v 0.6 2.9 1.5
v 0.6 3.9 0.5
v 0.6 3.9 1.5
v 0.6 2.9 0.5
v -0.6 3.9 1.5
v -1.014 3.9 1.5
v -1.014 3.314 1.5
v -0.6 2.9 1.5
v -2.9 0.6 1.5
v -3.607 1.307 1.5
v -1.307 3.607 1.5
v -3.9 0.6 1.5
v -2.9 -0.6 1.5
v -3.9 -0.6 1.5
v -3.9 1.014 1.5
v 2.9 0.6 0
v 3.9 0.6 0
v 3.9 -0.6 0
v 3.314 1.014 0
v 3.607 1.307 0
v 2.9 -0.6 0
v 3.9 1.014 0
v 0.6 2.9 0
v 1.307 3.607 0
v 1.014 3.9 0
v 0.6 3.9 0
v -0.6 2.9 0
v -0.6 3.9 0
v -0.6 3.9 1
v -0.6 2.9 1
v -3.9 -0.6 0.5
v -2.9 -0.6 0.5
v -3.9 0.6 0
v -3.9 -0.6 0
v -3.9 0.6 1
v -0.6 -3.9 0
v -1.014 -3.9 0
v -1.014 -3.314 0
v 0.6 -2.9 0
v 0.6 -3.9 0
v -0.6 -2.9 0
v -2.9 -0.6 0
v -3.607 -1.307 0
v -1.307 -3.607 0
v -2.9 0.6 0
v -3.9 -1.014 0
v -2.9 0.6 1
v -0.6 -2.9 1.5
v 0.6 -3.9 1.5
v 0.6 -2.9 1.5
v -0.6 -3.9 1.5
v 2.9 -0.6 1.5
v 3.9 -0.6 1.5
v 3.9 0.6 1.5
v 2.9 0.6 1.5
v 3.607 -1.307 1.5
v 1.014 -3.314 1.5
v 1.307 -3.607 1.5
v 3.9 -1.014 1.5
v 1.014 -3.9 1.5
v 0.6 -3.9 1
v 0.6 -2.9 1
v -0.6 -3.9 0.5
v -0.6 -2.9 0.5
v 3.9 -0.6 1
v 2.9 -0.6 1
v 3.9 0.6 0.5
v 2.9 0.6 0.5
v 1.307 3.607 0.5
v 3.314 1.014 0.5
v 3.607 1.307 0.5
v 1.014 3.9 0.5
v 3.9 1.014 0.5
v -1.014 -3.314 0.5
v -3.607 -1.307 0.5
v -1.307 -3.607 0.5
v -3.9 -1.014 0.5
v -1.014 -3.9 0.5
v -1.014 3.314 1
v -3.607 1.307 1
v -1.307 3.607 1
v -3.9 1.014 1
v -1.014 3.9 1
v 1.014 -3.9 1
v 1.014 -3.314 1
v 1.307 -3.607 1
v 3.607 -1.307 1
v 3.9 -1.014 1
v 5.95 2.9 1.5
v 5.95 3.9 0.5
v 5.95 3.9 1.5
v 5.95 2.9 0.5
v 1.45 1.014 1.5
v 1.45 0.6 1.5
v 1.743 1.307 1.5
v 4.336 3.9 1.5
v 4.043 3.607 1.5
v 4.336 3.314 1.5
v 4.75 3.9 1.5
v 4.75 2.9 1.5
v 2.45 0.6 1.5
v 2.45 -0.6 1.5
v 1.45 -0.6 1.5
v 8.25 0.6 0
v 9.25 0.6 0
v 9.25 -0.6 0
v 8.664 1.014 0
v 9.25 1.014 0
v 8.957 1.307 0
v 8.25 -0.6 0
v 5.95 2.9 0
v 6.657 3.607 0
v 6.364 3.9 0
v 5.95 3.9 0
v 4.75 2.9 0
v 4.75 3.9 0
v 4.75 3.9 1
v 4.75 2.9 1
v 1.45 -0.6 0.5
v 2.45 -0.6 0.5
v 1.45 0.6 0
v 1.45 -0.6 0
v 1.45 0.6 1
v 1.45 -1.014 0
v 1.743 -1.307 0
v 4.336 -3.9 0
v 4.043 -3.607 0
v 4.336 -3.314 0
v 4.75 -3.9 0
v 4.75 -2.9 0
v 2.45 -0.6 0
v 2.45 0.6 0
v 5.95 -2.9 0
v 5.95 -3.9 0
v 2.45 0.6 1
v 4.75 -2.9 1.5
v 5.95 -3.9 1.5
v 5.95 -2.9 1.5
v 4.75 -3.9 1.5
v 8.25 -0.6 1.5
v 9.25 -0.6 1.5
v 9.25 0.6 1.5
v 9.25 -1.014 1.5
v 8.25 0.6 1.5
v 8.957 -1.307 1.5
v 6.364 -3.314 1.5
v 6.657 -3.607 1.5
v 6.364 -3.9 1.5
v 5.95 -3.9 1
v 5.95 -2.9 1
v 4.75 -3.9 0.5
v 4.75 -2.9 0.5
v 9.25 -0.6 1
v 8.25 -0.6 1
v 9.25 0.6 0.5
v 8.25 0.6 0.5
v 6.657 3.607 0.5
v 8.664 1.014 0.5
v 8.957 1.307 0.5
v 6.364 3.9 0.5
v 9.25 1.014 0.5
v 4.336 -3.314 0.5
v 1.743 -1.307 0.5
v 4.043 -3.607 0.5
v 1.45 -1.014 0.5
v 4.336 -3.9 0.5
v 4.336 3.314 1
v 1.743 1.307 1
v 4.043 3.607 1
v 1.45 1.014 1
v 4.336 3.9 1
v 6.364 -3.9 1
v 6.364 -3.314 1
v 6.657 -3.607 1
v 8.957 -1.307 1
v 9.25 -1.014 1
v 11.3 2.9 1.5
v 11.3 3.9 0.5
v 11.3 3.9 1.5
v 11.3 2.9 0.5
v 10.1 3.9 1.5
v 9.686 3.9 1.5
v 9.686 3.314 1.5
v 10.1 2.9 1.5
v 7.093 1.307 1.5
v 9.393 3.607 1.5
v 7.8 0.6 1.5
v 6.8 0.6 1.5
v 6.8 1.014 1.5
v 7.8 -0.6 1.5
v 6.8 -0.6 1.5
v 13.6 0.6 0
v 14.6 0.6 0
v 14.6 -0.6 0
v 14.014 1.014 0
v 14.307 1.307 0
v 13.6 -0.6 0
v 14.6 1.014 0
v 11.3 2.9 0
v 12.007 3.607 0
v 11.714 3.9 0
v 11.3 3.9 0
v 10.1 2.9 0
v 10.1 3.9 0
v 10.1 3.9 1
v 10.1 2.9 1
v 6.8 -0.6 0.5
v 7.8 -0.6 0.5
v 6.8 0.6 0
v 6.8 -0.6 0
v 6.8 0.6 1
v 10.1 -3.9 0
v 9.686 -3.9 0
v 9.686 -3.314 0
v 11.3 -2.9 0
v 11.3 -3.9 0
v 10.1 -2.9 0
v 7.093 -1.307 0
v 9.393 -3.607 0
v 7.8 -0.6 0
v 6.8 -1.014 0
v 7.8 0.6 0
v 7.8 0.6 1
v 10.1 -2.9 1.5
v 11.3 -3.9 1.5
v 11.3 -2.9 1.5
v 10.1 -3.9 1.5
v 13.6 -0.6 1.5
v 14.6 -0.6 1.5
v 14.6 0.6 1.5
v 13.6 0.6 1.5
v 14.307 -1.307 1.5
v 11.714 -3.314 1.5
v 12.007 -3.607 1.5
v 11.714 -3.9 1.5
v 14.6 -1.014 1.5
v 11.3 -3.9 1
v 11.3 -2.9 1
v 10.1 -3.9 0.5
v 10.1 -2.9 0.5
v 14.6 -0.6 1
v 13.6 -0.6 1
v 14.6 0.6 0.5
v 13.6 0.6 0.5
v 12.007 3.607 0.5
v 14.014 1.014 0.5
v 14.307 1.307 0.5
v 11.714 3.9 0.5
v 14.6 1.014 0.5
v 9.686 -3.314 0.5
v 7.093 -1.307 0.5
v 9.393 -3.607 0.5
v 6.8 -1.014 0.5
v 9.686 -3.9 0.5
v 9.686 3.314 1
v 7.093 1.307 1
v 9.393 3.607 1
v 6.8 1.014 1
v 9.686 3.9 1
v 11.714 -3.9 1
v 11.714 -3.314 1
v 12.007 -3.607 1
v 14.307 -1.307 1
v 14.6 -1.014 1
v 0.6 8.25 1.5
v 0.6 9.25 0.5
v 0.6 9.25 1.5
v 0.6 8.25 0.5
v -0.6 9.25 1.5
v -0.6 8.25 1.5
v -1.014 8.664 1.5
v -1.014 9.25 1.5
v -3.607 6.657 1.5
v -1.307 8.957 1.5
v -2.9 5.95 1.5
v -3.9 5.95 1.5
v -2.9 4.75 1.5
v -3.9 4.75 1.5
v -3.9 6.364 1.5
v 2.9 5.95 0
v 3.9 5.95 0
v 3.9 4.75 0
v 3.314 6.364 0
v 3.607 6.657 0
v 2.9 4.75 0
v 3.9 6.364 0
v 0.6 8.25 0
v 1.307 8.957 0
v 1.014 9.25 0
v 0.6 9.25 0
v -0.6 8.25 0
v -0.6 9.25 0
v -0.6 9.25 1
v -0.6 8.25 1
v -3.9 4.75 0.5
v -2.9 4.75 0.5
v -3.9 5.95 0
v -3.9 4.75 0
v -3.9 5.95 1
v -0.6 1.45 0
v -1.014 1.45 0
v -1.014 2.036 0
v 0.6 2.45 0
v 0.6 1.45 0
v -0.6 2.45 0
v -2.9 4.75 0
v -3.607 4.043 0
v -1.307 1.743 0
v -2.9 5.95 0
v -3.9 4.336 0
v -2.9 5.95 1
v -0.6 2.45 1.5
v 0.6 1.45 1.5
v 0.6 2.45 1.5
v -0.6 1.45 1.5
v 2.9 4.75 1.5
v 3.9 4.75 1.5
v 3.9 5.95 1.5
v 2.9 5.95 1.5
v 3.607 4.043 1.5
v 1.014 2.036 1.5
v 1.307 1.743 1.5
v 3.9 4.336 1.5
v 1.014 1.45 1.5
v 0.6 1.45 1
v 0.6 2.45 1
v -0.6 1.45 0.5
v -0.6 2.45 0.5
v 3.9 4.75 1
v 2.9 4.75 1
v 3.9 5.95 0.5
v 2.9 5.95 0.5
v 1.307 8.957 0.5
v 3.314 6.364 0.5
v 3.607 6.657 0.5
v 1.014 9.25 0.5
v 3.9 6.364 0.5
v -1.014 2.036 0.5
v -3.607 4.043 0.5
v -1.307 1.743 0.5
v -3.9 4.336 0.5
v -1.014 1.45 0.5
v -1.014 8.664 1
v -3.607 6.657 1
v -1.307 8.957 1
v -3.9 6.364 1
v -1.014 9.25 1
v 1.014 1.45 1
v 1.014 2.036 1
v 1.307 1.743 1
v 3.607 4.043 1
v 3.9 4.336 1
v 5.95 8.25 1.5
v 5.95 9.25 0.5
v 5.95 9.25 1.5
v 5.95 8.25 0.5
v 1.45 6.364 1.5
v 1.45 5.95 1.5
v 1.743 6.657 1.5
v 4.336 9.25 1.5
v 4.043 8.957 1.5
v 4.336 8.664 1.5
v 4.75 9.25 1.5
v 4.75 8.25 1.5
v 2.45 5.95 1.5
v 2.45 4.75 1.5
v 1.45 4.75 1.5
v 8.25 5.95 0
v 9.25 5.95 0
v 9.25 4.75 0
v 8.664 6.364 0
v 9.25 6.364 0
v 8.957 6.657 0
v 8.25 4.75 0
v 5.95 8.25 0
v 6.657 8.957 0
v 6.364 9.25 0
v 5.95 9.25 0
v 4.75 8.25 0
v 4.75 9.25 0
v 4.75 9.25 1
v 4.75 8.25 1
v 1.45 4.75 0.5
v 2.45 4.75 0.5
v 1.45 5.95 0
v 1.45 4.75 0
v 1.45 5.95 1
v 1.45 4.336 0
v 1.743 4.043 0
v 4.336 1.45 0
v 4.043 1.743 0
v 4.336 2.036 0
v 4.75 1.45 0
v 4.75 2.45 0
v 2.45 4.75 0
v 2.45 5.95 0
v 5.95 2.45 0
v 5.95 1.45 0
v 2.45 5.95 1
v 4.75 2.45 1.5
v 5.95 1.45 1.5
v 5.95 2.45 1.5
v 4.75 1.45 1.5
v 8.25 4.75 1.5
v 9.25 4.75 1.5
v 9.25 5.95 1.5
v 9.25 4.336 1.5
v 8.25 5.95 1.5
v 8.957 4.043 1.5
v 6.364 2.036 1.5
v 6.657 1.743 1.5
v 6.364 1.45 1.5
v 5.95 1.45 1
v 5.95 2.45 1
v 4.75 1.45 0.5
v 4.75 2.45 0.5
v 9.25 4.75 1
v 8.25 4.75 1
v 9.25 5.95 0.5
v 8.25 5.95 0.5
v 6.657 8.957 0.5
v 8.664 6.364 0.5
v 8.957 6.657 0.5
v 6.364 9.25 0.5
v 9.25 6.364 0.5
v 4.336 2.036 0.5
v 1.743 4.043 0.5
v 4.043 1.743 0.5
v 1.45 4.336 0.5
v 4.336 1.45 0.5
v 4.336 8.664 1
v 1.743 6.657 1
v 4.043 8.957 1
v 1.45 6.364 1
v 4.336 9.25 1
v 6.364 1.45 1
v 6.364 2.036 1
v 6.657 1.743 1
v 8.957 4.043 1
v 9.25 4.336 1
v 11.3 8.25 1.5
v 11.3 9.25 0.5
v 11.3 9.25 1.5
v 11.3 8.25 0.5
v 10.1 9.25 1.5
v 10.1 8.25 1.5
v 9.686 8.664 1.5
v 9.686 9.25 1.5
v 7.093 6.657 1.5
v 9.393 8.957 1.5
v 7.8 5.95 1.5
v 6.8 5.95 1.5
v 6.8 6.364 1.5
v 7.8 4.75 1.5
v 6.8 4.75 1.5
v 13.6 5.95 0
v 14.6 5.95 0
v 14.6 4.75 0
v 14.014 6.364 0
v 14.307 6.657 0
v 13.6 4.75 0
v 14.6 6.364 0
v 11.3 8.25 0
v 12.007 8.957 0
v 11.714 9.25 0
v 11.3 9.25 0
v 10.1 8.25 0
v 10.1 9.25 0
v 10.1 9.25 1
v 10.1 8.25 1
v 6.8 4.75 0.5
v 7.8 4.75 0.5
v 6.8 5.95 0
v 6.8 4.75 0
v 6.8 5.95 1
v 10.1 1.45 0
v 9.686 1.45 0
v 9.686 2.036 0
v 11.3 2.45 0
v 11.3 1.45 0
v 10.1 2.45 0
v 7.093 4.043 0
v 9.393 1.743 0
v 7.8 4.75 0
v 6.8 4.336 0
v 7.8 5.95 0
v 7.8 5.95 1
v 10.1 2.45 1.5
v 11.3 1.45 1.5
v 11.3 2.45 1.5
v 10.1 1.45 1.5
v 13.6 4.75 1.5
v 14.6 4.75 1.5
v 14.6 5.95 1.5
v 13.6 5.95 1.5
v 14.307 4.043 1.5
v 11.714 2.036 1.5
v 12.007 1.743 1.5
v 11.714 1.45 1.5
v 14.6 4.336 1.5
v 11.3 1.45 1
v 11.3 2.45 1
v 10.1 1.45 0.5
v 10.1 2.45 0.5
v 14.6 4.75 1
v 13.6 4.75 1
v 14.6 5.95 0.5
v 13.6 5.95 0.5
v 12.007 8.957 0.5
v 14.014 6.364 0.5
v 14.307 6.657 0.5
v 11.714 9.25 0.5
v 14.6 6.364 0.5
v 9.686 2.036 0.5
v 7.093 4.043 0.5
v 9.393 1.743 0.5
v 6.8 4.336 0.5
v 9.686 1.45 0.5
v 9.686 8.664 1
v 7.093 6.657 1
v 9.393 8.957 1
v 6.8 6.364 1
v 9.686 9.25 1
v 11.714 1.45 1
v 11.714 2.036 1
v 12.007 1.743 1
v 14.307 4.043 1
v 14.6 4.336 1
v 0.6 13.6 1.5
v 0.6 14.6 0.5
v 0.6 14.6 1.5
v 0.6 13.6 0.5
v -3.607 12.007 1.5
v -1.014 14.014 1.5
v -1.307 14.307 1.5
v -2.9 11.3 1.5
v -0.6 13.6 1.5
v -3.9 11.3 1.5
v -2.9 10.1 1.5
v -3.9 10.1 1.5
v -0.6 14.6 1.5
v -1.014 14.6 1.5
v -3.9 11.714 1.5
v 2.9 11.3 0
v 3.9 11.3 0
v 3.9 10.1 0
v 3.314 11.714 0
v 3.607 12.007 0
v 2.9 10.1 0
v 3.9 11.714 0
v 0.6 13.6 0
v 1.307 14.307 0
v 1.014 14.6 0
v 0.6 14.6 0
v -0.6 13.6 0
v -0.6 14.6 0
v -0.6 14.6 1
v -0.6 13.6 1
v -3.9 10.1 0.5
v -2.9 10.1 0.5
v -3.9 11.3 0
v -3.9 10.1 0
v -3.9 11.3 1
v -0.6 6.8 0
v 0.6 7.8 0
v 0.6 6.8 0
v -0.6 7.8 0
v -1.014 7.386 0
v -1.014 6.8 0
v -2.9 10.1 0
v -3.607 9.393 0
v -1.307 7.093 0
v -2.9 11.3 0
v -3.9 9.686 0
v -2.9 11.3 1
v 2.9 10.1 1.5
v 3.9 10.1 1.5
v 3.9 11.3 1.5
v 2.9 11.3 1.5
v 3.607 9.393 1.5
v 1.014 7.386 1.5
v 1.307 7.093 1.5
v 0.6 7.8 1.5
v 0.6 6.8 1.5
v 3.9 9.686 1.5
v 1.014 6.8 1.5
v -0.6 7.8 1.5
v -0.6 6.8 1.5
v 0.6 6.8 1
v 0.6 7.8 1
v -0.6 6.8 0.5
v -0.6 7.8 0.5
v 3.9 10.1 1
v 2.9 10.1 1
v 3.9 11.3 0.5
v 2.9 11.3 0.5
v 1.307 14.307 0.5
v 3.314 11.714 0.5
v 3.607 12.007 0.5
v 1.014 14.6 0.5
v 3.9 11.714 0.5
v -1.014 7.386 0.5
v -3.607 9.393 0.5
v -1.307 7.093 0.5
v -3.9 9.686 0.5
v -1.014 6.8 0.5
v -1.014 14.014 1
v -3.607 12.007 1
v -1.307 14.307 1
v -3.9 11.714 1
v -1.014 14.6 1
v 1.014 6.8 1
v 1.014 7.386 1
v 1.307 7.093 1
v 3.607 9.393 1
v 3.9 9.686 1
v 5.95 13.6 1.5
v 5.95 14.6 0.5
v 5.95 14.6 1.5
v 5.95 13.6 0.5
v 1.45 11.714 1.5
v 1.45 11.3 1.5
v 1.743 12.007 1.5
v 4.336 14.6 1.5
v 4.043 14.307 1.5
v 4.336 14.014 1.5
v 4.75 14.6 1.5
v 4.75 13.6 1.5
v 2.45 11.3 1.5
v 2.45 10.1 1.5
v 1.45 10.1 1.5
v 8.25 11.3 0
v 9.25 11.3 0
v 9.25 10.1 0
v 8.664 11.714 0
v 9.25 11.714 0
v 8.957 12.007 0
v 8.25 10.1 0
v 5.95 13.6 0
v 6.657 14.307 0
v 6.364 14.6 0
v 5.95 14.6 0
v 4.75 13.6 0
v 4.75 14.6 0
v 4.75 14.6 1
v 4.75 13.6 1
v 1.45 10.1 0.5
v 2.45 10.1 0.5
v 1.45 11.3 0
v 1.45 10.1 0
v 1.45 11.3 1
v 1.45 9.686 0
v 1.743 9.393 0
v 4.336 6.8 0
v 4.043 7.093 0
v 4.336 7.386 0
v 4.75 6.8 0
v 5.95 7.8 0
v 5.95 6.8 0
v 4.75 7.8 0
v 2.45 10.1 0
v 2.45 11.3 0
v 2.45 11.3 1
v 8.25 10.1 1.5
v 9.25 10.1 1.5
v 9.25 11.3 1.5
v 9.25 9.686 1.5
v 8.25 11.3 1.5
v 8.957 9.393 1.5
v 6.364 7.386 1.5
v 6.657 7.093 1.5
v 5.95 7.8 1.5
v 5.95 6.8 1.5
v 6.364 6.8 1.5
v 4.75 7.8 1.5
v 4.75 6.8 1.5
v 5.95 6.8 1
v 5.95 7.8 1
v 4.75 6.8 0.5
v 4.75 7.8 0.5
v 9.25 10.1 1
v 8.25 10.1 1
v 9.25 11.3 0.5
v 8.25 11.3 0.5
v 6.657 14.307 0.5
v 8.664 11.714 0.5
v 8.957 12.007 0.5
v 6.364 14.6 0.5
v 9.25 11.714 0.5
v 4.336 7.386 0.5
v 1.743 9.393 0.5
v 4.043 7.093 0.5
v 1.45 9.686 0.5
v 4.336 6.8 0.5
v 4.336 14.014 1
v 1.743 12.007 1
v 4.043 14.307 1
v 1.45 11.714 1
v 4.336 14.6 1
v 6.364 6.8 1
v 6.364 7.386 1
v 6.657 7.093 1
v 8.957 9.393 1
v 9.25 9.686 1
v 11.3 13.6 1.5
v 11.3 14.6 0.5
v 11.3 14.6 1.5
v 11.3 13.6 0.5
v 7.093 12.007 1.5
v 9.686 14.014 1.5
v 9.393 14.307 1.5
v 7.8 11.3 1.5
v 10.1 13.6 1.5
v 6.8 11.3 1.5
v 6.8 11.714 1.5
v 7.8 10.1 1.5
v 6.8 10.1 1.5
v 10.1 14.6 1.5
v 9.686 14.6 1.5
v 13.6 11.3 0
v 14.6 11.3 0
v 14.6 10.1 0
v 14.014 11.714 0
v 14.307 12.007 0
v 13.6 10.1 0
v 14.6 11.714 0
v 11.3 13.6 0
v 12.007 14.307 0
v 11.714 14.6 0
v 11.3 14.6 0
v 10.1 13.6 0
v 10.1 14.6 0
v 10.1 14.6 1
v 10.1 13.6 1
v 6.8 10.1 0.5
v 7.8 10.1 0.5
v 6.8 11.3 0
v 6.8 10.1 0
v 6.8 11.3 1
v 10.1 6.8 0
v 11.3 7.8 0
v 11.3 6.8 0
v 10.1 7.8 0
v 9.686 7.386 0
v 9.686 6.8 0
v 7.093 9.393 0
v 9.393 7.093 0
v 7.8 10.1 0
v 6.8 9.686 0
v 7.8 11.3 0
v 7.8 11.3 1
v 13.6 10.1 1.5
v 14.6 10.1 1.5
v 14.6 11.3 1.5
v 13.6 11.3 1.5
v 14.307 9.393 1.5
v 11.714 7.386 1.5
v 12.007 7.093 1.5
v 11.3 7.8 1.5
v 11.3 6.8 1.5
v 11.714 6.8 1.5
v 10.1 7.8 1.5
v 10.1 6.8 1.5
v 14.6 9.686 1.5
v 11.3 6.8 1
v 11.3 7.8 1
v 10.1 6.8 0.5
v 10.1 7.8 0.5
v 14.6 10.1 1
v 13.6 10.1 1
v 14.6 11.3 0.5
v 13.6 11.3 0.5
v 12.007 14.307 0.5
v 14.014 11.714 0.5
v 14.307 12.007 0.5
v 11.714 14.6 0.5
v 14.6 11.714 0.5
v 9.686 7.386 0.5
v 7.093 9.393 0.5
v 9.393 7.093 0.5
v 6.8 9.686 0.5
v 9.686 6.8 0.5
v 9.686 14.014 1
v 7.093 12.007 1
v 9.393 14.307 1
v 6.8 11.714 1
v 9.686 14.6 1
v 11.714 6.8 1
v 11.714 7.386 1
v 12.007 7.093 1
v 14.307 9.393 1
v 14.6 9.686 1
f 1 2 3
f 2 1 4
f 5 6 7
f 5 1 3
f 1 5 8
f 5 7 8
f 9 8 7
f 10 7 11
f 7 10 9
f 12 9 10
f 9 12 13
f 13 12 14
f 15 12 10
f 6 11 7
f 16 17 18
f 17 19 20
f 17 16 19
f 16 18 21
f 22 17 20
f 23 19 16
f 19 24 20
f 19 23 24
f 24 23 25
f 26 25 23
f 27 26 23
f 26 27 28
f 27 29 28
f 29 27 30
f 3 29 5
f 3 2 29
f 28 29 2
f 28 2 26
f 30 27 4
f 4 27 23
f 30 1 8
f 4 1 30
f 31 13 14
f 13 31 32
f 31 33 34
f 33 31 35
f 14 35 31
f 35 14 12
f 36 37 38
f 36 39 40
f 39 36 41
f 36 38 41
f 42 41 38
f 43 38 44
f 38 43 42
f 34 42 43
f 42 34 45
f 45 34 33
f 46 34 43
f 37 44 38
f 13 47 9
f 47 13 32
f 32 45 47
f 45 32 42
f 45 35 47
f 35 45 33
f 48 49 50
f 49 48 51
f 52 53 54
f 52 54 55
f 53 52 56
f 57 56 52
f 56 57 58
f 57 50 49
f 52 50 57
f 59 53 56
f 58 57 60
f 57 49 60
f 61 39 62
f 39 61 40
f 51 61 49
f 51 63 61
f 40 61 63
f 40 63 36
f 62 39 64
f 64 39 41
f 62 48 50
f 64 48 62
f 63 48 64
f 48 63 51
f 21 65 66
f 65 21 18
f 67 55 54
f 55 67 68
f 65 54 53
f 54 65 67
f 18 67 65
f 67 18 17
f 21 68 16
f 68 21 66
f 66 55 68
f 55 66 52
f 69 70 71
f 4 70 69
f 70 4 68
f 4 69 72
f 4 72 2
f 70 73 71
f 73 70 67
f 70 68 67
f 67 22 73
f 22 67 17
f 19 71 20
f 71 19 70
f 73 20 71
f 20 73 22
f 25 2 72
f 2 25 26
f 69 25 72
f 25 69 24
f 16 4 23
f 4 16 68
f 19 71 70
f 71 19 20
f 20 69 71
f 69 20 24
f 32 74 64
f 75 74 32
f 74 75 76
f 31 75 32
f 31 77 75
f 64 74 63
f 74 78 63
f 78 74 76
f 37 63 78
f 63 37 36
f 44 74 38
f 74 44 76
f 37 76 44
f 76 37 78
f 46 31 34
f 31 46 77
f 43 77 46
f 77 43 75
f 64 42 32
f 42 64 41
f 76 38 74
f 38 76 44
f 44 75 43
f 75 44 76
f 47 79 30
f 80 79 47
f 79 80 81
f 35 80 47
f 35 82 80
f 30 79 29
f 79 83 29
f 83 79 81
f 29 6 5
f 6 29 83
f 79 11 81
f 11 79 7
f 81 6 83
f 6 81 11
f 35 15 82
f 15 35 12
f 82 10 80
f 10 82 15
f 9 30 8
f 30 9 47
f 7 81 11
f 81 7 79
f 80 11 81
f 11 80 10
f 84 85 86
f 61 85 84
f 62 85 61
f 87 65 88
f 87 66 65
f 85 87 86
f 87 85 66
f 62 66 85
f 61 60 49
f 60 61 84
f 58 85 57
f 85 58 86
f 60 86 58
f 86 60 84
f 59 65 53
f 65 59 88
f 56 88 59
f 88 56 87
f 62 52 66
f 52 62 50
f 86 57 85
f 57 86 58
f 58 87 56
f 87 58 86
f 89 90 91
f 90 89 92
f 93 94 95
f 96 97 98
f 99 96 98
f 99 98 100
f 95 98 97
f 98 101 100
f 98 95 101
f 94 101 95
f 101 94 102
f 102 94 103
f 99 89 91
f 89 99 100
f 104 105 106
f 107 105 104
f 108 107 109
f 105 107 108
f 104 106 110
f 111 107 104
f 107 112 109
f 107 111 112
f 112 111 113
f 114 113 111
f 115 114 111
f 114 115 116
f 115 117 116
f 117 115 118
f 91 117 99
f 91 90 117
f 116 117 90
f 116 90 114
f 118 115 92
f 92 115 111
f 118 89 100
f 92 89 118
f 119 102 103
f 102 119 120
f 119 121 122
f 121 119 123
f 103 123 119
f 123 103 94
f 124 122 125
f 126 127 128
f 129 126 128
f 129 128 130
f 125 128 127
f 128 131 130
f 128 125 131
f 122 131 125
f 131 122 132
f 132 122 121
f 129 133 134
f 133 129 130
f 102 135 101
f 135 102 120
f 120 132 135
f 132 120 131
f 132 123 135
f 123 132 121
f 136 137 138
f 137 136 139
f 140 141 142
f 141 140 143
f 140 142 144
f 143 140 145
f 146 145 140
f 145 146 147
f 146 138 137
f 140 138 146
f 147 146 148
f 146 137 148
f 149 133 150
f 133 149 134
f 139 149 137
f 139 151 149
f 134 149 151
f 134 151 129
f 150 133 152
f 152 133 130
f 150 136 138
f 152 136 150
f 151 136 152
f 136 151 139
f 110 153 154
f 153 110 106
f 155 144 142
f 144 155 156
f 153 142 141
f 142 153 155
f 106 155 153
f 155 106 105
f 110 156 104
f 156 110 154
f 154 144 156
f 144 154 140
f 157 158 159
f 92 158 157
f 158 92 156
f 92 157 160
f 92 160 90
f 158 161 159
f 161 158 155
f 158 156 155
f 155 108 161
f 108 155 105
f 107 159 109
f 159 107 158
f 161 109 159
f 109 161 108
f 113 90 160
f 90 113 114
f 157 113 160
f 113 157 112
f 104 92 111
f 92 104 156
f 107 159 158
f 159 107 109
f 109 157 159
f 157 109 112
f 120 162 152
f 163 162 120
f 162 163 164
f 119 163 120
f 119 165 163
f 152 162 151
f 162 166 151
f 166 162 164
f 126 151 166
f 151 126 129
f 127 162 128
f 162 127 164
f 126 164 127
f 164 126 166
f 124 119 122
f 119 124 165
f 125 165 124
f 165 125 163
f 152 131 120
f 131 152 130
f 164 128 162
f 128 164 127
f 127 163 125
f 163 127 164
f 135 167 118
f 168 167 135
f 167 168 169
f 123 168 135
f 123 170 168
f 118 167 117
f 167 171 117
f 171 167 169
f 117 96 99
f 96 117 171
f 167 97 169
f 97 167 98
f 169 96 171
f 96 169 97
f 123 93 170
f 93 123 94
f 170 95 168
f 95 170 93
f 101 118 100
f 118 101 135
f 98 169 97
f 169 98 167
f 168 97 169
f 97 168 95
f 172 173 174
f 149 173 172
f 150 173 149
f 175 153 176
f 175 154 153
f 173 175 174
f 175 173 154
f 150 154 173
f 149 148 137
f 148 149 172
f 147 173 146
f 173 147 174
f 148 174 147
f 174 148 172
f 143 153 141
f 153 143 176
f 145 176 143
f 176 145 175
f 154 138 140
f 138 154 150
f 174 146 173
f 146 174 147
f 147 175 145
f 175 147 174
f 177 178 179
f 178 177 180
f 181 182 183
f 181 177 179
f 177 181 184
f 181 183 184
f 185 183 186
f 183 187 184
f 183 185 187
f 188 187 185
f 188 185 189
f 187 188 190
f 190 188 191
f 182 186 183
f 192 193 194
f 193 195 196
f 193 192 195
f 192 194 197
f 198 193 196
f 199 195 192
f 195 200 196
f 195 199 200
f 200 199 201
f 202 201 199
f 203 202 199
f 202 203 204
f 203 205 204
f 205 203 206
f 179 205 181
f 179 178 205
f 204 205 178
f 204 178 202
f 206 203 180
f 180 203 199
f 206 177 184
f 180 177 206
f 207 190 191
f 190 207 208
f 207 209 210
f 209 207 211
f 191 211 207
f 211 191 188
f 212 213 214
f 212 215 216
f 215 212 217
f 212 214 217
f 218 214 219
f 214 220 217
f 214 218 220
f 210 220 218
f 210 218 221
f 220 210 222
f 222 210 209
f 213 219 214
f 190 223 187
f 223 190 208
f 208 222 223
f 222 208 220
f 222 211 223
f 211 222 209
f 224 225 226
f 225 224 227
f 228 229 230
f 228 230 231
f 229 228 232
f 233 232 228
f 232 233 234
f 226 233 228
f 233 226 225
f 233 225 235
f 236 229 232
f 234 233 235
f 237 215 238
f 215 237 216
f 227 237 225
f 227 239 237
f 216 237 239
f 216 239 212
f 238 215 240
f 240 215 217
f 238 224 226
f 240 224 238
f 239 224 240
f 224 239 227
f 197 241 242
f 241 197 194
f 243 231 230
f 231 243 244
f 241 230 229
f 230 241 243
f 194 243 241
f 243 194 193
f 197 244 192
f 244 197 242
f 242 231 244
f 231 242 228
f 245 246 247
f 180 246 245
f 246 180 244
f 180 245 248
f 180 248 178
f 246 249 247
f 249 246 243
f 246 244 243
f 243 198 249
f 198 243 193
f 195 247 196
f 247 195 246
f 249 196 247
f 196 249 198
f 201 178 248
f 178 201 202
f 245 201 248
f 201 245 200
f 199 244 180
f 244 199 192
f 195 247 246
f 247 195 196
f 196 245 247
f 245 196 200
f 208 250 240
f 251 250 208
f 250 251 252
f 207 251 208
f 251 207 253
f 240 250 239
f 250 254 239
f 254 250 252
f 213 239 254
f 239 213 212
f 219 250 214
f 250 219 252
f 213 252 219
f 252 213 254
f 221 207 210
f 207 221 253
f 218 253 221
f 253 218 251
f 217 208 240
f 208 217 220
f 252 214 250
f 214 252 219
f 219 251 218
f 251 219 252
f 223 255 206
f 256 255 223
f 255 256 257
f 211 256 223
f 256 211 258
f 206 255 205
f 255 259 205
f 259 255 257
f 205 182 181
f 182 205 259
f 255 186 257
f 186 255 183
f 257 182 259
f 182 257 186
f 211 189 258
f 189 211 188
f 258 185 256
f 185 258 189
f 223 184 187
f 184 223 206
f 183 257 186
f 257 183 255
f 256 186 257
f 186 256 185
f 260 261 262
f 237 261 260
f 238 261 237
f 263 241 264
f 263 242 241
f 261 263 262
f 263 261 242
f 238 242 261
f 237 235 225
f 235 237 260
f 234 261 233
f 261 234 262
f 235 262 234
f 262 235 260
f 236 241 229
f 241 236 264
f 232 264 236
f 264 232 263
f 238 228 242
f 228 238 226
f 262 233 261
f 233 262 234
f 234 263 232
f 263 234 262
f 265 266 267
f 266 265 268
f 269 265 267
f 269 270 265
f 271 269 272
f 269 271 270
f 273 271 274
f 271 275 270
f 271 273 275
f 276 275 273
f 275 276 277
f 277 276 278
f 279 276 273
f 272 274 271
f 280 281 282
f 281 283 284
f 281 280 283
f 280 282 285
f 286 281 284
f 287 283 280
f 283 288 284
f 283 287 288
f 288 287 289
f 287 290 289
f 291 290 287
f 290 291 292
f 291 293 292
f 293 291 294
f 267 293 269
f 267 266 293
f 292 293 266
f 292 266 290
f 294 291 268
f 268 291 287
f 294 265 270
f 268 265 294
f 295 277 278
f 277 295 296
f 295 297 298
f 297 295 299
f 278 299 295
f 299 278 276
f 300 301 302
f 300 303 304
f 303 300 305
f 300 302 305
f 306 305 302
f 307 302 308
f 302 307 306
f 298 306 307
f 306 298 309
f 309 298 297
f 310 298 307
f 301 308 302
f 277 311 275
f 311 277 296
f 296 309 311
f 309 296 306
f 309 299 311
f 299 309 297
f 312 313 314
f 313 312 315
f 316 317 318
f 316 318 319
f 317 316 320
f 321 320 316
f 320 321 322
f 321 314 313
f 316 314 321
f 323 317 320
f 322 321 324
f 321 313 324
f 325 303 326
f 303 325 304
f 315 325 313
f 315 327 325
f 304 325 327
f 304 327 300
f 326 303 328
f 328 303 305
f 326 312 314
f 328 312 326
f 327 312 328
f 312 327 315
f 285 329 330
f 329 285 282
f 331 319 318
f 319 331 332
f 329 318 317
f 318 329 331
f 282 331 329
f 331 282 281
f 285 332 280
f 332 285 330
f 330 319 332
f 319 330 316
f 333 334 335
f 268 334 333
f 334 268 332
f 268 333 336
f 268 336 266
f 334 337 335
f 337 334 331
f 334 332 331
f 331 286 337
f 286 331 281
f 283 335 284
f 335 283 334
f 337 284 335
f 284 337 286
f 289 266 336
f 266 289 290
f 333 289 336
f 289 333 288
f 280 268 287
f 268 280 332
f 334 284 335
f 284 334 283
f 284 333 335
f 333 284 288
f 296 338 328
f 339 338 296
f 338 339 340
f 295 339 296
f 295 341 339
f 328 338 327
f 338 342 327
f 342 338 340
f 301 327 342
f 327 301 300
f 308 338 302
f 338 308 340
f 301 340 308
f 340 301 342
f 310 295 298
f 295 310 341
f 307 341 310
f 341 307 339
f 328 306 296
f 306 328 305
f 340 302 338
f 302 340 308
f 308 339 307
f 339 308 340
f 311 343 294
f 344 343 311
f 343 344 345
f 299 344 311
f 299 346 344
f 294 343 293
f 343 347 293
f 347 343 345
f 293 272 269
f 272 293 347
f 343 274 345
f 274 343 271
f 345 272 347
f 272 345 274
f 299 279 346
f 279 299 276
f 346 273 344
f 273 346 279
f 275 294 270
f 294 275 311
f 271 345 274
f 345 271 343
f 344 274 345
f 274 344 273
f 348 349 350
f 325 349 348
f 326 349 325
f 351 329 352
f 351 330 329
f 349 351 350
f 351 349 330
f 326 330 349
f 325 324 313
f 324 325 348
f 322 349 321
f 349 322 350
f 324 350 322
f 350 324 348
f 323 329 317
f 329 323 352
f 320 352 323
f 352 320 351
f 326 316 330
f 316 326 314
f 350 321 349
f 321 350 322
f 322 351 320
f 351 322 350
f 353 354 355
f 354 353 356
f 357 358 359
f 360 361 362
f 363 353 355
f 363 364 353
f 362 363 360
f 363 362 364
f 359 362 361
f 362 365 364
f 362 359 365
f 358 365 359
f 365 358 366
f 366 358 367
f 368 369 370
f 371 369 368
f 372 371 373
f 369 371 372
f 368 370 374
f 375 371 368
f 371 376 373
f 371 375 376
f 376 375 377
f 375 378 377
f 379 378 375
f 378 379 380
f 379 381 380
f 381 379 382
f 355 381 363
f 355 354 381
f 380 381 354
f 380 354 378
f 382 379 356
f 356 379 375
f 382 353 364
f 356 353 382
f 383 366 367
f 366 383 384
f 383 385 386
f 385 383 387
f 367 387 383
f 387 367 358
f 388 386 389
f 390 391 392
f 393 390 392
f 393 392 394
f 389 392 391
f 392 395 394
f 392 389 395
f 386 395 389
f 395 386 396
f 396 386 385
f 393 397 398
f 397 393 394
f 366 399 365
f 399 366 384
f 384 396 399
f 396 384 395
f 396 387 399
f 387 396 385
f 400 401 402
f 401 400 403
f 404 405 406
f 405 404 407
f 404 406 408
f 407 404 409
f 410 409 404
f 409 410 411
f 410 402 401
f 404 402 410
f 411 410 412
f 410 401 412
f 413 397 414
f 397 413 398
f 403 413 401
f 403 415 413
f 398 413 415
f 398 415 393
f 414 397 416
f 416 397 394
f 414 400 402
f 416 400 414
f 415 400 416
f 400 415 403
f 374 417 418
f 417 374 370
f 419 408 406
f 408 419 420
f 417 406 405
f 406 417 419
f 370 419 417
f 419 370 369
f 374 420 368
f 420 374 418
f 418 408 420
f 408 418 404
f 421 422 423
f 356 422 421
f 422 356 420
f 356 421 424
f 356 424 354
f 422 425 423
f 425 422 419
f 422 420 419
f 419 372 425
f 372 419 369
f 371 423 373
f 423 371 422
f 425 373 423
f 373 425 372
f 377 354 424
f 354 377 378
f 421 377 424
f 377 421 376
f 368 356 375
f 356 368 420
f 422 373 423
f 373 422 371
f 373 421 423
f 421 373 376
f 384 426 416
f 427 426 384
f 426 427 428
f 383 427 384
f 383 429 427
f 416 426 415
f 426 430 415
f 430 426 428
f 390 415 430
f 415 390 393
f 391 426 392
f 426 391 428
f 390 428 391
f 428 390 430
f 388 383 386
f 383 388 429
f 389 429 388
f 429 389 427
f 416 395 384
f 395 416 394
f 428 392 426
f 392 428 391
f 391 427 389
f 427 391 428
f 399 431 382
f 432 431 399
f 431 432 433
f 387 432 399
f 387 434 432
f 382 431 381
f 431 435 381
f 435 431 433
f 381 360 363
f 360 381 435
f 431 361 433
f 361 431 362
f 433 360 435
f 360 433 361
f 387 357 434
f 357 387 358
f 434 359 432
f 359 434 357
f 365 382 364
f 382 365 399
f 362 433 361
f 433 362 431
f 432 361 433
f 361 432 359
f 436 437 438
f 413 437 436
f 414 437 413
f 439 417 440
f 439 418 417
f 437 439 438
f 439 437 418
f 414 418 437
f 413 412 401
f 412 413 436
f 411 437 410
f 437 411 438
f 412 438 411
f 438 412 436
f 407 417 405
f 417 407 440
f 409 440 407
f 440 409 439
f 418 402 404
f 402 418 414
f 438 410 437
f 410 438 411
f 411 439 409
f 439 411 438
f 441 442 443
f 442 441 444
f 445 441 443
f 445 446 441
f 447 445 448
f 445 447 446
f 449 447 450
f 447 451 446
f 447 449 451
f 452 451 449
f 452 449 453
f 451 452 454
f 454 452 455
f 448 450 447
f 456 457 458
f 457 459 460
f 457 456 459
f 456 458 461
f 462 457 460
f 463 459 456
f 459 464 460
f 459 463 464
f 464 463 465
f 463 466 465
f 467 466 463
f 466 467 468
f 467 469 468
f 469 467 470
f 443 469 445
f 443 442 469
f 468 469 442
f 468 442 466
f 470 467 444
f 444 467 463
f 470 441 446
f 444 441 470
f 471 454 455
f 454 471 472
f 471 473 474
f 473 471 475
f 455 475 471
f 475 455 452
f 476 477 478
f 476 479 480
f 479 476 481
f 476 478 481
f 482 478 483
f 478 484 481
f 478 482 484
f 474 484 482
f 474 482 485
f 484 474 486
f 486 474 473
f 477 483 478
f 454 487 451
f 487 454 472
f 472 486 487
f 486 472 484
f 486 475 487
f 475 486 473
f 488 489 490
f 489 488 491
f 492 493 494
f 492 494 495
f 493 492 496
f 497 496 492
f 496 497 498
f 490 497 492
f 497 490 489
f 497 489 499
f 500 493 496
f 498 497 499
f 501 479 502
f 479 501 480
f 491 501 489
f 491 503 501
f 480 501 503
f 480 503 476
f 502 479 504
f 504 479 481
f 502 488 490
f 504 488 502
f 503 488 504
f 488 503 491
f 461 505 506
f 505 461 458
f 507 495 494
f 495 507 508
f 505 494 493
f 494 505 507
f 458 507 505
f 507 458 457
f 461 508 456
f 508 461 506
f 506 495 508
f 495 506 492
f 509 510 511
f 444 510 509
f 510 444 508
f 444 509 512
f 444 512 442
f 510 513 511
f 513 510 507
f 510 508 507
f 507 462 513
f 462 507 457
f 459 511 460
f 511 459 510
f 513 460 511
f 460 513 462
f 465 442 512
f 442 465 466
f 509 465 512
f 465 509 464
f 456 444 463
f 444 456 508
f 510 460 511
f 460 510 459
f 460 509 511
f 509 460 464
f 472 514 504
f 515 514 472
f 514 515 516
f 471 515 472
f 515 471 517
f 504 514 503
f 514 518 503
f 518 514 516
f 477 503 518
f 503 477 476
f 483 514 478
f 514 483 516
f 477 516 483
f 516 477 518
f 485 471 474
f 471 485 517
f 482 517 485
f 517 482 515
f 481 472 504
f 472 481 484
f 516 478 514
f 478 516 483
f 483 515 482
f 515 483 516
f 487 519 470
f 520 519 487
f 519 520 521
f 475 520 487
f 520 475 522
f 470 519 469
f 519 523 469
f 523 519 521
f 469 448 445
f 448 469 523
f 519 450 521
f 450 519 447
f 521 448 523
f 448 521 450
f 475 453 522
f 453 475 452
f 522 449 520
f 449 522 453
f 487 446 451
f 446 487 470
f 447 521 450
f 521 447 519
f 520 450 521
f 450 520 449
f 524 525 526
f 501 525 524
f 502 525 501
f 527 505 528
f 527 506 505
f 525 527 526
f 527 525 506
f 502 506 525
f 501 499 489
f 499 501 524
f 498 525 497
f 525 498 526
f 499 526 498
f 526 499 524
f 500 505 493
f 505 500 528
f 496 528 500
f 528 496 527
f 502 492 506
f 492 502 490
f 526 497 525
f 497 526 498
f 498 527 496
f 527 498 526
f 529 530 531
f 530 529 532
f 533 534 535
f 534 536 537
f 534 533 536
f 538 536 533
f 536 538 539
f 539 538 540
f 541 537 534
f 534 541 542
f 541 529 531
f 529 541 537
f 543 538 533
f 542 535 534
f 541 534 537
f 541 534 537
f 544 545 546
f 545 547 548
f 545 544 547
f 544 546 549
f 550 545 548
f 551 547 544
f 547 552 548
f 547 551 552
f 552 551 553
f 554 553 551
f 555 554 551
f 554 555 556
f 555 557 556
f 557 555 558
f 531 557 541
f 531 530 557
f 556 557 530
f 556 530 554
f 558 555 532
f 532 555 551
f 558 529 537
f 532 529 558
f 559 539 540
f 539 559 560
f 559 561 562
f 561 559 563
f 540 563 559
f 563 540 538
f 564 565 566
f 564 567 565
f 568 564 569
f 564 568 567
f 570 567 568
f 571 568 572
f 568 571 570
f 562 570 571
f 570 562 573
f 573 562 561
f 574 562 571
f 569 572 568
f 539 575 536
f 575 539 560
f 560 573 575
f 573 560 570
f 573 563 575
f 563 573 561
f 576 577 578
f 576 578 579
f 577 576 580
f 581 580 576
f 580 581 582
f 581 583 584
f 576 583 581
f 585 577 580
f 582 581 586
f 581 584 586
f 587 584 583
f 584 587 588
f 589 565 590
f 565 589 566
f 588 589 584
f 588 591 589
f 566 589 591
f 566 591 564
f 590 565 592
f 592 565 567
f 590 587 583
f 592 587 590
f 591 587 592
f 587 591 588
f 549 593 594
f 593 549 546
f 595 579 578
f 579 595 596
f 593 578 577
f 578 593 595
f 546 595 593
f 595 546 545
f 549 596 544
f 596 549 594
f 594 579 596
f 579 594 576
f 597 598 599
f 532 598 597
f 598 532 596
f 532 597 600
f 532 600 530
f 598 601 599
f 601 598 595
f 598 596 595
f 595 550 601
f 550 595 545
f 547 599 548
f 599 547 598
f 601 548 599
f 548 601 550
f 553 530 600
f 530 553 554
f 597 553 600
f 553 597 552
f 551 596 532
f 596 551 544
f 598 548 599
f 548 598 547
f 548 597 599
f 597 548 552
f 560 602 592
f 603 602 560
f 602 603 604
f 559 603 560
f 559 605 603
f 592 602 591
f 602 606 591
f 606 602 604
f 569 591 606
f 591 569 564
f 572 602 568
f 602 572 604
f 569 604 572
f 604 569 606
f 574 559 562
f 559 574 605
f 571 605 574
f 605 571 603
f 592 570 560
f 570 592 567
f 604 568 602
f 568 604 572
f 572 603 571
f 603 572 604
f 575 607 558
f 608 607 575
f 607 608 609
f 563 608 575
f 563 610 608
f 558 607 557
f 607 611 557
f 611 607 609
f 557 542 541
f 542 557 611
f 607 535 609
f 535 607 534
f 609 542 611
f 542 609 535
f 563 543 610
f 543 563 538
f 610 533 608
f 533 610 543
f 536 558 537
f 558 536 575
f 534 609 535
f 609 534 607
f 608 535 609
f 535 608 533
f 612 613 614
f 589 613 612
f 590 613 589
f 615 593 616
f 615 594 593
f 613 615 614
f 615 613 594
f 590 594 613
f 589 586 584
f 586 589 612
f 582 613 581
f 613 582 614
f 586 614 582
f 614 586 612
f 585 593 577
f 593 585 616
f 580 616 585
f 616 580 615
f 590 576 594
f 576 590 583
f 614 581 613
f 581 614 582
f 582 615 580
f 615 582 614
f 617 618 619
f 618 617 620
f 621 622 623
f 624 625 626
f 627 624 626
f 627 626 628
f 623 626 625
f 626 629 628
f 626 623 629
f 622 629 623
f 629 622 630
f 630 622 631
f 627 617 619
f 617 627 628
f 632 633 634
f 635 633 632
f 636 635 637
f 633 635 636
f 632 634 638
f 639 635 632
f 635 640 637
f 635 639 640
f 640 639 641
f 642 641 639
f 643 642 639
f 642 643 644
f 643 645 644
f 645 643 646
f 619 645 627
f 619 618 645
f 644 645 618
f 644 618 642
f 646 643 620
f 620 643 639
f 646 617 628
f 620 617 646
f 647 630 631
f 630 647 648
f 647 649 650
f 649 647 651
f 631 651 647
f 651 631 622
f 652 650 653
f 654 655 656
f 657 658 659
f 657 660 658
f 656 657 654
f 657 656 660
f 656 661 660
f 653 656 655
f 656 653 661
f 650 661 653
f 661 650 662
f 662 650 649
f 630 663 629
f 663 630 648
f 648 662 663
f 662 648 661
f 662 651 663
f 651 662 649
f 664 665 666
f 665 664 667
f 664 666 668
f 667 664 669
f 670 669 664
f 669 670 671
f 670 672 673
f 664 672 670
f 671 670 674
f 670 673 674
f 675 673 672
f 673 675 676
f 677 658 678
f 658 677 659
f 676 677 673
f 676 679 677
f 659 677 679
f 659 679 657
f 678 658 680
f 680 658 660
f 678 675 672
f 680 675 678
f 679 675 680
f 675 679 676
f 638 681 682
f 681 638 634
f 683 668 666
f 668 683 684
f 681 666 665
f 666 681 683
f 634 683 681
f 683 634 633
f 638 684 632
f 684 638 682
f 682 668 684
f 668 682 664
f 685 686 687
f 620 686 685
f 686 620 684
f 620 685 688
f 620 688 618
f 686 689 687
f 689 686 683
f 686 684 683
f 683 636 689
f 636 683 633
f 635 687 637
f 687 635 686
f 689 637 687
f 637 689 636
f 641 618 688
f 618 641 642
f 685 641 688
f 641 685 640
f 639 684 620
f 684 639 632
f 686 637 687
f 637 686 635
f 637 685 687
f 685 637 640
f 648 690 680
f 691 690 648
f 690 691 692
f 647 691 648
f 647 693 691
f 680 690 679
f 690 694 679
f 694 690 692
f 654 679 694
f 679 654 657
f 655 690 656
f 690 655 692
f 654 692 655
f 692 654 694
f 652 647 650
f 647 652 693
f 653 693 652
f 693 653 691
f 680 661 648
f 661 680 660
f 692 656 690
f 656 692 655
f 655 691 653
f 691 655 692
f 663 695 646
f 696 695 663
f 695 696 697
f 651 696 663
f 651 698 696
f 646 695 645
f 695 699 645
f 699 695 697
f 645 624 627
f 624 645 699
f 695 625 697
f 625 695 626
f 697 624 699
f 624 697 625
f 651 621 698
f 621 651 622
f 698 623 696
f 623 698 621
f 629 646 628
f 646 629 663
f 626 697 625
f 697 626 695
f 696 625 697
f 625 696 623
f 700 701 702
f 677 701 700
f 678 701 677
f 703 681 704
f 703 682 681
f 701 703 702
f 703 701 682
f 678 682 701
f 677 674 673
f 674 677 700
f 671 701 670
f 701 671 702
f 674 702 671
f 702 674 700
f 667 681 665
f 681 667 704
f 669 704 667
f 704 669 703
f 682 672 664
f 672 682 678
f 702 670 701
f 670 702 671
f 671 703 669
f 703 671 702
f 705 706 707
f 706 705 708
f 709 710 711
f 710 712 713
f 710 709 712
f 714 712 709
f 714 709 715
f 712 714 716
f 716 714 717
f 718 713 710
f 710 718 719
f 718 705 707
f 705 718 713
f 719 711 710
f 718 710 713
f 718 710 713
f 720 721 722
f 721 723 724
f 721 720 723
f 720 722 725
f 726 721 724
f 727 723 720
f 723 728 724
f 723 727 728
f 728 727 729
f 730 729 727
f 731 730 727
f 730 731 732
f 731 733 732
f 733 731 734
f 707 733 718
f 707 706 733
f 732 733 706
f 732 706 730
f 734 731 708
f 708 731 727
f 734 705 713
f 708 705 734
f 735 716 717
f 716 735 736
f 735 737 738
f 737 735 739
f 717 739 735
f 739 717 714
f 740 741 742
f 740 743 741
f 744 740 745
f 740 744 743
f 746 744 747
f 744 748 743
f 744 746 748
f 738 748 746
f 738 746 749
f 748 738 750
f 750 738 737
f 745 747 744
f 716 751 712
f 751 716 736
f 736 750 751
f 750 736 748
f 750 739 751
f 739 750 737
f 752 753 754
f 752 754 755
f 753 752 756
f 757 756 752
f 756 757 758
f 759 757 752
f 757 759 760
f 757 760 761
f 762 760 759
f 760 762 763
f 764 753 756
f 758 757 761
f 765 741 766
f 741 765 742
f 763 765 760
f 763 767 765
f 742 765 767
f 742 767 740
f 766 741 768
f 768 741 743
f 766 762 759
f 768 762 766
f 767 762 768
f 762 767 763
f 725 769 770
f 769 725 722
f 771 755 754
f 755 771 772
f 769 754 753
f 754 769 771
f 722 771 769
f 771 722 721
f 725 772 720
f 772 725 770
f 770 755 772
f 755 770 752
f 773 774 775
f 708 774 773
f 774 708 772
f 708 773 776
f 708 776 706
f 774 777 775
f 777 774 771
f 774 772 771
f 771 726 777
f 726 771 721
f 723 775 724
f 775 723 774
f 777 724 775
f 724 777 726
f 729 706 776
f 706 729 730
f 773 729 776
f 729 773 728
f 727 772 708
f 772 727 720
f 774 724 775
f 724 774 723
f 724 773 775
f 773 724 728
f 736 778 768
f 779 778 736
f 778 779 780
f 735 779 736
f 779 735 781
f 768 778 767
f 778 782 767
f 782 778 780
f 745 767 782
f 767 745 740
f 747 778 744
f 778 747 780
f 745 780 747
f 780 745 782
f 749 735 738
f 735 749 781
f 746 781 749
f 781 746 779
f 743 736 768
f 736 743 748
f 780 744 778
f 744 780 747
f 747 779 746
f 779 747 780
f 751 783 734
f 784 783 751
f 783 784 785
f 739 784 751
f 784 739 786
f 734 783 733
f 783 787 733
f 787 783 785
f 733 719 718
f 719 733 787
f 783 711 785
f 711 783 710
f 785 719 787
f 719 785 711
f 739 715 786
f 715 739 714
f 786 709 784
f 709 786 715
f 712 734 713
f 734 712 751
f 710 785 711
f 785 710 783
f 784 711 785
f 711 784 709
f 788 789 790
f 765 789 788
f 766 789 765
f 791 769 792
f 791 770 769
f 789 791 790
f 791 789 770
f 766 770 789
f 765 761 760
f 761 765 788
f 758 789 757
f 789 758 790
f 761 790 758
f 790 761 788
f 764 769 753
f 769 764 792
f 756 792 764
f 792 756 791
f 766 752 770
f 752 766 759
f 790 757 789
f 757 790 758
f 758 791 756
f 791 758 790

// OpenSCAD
module chain(w,h)
{

module ring()
{
	module blocks()  //four blocks
	{	
		for (i = [0:3]){		
		rotate([0,0,90*i])
			translate([-0.6001,r_halfwidth,0])
				cube([1.2002,line_width*b_width,layer_thick*b_height]); }
	}

	module diagonal() 	//thin diagonals
		{
			mirror([-1,1,0])
				translate([0.6,r_halfwidth,0])
				union() {
				cube([corner,line_width*b_width,layer_thick*d_height]);
				rotate([0,0,-45])
					translate([-corner,0,0])
					cube([corner,line_width*b_width,layer_thick*d_height]);
				}
			translate([0.6,r_halfwidth,0])
			union() {
				cube([corner,line_width*b_width,layer_thick*d_height]);
				rotate([0,0,-45])
					translate([-corner,0,0])
					cube([corner,line_width*b_width,layer_thick*d_height]);
				rotate([0,0,-45])
					cube([sqrt(2)*(r_halfwidth-0.6),line_width*b_width,layer_thick*d_height]);
					}	
		}
	module 4_diagonals() //all four diagonals
		{
		union(){
		diagonal();
		mirror([1,1,0]) diagonal(); }
		translate([0,0,layer_thick*(b_height-d_height)]) 
			union(){
				rotate([0,0,90]) diagonal();
				rotate([0,0,-90]) diagonal(); }				
		}

union(){
	blocks();
	4_diagonals();	
	}	
}



	layer_thick = 0.25;  //filament layer thickness
	line_width = 0.5;    //filament line width, = layer thickness * width/thickness
	
	b_width = 2;	//block width in lines
	b_height = 6;    //block height in layers
	d_height = 2; 		//diagonals height in lines

	r_halfwidth = .95+1.5*line_width*b_width+0.45; //ring inner half width
	corner = tan(22.5)*line_width*b_width;  	  //fills in corner between block and diagonal

module line() {
for(i=[0:w-1]){
translate([i*(2*r_halfwidth-.45),0,0])
ring();}}

for(j=[0:h-1]){
translate([0,j*(2*r_halfwidth-.45),0])
line();}
}

//usage: chain(w,h) gives w columns, h rows
chain(3,3);
